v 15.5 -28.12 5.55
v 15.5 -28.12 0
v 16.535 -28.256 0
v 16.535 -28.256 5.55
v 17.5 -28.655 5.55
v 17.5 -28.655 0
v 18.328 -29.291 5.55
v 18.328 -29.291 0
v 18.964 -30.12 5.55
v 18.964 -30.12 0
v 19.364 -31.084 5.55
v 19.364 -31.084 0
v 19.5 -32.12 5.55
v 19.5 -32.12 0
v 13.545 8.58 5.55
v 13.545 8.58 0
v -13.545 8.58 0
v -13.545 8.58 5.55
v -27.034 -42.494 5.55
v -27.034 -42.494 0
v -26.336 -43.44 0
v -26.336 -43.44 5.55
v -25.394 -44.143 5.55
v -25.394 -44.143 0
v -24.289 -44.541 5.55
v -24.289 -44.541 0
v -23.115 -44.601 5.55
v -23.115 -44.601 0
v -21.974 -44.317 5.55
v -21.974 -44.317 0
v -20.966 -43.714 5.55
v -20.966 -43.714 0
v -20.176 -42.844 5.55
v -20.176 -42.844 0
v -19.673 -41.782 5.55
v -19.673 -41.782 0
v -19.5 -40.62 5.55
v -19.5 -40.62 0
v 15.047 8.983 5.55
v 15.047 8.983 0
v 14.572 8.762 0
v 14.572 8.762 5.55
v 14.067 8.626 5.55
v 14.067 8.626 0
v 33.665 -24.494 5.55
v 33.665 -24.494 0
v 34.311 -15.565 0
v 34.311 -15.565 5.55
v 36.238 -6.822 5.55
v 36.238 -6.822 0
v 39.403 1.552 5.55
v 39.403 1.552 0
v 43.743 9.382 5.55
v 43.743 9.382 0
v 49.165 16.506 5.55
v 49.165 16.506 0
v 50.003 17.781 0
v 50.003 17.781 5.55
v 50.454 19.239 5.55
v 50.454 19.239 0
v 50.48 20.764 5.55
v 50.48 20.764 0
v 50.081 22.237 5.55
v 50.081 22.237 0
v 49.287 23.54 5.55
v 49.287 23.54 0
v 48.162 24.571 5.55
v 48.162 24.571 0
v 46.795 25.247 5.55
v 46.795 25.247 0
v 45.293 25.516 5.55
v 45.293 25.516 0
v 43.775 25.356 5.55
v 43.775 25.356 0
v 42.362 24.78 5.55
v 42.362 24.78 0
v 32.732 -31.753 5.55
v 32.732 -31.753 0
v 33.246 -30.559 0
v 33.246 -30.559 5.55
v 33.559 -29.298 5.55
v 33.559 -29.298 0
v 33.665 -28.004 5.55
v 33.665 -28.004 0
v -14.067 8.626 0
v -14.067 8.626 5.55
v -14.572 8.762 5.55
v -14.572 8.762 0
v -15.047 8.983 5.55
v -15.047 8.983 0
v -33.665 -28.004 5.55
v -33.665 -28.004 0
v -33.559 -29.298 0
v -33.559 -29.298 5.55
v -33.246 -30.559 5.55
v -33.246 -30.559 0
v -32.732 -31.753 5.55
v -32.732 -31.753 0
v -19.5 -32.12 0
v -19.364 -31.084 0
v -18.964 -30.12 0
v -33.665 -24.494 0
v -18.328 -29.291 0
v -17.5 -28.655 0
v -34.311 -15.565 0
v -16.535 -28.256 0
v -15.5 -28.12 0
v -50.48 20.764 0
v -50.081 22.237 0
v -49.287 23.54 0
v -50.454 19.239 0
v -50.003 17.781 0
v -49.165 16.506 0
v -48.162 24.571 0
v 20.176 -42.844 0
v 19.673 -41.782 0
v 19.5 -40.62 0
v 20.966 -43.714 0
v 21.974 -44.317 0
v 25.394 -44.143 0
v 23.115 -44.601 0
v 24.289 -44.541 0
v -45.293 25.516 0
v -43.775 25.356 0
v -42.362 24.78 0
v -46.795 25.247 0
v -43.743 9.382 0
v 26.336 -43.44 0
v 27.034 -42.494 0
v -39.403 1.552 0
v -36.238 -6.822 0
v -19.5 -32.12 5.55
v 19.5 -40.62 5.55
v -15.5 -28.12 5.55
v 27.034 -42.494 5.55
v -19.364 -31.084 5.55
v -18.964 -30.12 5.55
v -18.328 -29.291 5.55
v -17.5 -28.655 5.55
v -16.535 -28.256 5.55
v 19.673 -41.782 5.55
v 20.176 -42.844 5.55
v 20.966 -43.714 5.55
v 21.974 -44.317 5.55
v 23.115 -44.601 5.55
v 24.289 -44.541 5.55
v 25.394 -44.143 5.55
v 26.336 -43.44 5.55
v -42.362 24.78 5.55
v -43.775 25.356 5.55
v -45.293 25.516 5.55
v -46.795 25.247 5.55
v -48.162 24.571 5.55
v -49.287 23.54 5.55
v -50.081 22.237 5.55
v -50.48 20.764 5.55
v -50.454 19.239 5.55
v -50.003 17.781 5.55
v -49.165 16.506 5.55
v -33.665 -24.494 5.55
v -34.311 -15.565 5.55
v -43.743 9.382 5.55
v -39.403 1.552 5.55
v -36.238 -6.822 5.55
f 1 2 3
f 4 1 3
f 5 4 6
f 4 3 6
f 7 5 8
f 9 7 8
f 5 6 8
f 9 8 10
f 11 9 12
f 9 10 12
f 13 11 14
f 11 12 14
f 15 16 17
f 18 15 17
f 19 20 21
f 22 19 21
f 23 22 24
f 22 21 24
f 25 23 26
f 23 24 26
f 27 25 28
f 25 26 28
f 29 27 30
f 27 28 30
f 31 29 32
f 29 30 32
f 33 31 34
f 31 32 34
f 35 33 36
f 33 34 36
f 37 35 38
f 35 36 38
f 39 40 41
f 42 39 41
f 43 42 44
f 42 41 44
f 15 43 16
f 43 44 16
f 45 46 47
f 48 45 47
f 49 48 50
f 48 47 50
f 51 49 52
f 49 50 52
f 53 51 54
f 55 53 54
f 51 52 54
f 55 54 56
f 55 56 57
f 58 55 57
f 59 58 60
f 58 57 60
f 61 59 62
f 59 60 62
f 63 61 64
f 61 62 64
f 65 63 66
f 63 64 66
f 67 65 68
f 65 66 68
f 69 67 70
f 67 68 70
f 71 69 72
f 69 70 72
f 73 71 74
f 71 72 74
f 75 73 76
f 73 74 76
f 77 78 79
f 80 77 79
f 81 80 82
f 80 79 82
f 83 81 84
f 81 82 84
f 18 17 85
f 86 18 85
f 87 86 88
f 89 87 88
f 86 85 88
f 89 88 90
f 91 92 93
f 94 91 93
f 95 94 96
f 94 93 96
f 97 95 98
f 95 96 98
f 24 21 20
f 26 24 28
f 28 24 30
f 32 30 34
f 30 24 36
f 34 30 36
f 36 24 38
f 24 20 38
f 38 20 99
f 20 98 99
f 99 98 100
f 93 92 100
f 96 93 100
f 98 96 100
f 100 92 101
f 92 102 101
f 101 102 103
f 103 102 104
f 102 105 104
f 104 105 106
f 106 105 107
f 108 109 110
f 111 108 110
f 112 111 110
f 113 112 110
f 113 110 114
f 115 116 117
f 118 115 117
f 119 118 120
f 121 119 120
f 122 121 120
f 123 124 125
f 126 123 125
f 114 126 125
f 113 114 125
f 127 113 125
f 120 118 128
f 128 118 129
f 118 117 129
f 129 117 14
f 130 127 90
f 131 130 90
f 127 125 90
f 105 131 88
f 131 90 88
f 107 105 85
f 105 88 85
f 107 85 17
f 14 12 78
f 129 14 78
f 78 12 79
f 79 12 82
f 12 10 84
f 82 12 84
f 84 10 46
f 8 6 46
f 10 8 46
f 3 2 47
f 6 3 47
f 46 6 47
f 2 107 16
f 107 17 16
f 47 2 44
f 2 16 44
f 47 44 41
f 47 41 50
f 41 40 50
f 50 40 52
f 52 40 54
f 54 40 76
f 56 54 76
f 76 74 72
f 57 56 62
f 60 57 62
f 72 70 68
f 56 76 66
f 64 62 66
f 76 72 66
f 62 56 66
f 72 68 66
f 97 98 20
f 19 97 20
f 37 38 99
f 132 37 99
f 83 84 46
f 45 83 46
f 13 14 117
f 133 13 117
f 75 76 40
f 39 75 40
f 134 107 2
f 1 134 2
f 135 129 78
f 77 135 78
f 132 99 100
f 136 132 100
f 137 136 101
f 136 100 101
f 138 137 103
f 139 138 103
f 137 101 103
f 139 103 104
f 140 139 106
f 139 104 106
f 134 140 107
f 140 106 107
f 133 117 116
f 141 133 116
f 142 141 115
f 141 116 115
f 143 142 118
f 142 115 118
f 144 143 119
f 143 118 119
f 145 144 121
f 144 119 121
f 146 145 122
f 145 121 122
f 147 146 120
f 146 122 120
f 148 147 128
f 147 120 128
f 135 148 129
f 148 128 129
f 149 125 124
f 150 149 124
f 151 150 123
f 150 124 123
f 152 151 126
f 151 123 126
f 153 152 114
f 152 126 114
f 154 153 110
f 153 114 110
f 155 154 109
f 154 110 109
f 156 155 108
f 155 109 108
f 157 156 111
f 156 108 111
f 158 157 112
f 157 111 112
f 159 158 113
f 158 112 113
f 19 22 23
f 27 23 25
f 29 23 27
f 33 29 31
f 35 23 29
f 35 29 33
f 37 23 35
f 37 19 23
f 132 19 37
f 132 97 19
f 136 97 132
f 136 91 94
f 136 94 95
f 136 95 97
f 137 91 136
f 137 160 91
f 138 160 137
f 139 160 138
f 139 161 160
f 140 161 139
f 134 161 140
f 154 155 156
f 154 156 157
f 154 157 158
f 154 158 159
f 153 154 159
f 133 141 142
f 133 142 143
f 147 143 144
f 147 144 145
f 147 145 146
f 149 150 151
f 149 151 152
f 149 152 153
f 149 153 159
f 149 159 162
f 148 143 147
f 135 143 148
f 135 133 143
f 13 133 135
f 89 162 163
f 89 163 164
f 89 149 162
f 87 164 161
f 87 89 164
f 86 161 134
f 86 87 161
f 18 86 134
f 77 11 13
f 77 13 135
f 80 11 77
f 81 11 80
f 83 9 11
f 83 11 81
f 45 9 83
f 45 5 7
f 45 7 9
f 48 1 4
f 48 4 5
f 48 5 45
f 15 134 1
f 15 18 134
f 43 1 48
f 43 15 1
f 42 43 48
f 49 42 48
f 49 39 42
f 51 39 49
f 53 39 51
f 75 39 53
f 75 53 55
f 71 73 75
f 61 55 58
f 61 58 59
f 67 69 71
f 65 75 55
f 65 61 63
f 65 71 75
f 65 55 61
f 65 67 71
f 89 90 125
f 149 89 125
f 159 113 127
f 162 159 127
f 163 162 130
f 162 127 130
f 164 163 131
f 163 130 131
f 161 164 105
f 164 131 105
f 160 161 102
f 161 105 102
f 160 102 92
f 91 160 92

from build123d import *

# Parameters (mm, degrees)
RESSALTO_EXTRUS_O1_DEPTH = 5.55


with BuildPart() as part:
    # Esboço1 → Ressalto-extrusão1 (new body)
    with BuildSketch(Plane.XY):
        with BuildLine():
            Line((-15.5, -28.119565217), (15.5, -28.119565217))
            ThreePointArc((15.5, -28.119565217), (18.328427125, -29.291138093), (19.5, -32.119565217))
            Line((19.5, -32.119565217), (19.5, -40.619565217))
            ThreePointArc((19.5, -40.619565217), (22.534152087, -44.501206341), (27.033568905, -42.494102706))
            Line((27.033568905, -42.494102706), (32.73188308, -31.75258065))
            ThreePointArc((32.73188308, -31.75258065), (33.428027517, -29.935201499), (33.664745271, -28.003505673))
            Line((33.664745271, -28.003505673), (33.664745271, -24.494102706))
            ThreePointArc((33.664745271, -24.494102706), (37.669109742, -2.578069762), (49.164745271, 16.505897294))
            ThreePointArc((49.164745271, 16.505897294), (49.287222325, 23.539892597), (42.362401343, 24.780434783))
            Line((42.362401343, 24.780434783), (15.046868421, 8.983444446))
            ThreePointArc((15.046868421, 8.983444446), (14.322494504, 8.682938362), (13.544989202, 8.580434783))
            Line((13.544989202, 8.580434783), (-13.544989202, 8.580434783))
            ThreePointArc((-13.544989202, 8.580434783), (-14.322494504, 8.682938362), (-15.046868421, 8.983444446))
            Line((-15.046868421, 8.983444446), (-42.362401343, 24.780434783))
            ThreePointArc((-42.362401343, 24.780434783), (-49.287222325, 23.539892597), (-49.164745271, 16.505897294))
            ThreePointArc((-49.164745271, 16.505897294), (-37.669109742, -2.578069762), (-33.664745271, -24.494102706))
            Line((-33.664745271, -24.494102706), (-33.664745271, -28.003505673))
            ThreePointArc((-33.664745271, -28.003505673), (-33.428027517, -29.935201499), (-32.73188308, -31.75258065))
            Line((-32.73188308, -31.75258065), (-27.033568905, -42.494102706))
            ThreePointArc((-27.033568905, -42.494102706), (-22.534152087, -44.501206341), (-19.5, -40.619565217))
            Line((-19.5, -40.619565217), (-19.5, -32.119565217))
            ThreePointArc((-19.5, -32.119565217), (-18.328427125, -29.291138093), (-15.5, -28.119565217))
        make_face()
    extrude(amount=RESSALTO_EXTRUS_O1_DEPTH)


solid = part.part
